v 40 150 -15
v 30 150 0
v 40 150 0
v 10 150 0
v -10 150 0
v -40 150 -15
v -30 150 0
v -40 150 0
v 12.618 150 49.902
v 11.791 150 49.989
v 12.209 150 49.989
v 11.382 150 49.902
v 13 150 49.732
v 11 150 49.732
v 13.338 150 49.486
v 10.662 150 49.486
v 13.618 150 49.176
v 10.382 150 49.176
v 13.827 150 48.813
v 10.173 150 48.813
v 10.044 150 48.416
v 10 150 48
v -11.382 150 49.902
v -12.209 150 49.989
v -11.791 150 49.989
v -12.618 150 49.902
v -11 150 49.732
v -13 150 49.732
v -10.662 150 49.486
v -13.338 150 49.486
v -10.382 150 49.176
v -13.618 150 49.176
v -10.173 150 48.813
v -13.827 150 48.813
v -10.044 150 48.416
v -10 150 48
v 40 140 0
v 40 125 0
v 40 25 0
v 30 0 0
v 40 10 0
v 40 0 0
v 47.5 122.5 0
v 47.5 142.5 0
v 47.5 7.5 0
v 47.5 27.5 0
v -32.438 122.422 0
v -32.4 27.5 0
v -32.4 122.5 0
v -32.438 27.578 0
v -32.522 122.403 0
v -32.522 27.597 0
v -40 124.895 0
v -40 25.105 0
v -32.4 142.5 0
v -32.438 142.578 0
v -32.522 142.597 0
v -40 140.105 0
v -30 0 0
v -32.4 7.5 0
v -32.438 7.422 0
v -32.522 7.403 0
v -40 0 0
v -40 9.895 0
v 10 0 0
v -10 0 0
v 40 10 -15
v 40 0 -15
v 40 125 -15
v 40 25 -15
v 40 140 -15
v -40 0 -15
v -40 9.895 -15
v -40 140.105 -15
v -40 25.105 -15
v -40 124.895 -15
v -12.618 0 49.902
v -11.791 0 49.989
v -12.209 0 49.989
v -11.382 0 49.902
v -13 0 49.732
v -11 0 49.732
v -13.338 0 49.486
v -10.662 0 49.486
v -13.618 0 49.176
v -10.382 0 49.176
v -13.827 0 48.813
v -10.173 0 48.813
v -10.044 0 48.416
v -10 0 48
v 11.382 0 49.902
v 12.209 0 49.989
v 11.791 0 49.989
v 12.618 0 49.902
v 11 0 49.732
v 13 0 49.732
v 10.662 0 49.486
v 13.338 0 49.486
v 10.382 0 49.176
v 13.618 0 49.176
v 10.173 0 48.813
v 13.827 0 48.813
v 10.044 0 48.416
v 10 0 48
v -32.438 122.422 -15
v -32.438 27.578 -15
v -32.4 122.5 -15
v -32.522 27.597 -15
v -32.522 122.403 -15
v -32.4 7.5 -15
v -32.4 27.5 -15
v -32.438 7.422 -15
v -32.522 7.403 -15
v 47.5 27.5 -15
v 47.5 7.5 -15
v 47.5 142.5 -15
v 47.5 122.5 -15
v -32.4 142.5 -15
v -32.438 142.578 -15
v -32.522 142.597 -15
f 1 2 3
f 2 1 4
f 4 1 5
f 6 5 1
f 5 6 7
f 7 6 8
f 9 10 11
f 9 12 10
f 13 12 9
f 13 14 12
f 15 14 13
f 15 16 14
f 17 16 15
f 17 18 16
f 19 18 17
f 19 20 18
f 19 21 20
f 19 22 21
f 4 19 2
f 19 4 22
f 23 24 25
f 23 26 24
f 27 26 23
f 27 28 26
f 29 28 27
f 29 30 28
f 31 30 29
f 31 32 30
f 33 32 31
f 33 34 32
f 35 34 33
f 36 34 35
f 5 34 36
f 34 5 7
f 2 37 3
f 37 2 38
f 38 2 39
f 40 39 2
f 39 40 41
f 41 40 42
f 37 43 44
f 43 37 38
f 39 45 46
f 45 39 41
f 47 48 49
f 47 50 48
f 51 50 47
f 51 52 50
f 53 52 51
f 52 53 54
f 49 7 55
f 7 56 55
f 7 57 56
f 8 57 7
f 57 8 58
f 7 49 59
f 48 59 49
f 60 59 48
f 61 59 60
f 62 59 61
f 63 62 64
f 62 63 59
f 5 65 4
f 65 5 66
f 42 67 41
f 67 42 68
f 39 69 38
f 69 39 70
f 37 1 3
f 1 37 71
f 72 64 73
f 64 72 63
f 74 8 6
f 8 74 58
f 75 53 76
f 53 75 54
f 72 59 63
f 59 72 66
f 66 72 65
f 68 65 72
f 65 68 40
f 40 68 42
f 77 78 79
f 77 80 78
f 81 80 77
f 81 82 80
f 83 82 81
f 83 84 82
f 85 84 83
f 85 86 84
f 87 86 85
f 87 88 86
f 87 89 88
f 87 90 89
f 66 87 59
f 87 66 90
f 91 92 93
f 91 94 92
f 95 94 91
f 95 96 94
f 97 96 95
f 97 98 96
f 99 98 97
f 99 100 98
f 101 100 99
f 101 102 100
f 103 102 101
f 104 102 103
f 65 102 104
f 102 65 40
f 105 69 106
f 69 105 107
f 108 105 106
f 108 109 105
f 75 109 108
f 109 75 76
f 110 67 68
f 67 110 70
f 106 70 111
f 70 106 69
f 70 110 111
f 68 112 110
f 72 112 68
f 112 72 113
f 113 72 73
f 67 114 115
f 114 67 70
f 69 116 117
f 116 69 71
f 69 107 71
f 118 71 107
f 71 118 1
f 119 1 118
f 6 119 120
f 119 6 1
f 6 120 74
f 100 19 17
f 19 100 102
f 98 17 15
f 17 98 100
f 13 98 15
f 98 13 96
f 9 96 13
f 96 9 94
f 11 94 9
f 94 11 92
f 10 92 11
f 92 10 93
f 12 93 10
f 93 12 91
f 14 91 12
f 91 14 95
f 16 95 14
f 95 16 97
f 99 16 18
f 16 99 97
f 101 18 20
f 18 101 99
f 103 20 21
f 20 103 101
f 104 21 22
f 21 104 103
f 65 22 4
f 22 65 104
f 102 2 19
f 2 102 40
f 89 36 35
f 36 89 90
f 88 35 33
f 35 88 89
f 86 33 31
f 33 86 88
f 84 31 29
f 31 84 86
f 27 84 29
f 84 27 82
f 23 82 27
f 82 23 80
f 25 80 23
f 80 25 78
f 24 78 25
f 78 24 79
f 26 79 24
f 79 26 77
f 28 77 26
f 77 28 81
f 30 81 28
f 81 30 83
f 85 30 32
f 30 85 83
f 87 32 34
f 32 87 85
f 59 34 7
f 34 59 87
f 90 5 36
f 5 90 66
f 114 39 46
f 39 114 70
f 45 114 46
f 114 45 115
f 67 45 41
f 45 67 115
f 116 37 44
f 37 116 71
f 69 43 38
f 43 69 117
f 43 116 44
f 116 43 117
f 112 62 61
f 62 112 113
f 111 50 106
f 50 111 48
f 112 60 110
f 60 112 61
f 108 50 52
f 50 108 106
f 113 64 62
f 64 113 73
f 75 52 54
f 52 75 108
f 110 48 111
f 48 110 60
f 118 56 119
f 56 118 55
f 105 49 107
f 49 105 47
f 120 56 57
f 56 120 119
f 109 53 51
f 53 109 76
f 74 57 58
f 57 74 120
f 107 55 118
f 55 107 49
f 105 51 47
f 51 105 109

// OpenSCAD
make_left_tabs = true;
make_right_tabs = true;
make_laptop_walls = true;

base_height = 15;
base_width = 80;
base_depth = 150;
base_rounding = 10;

tab_outer_width = 20;
tab_inner_width = 15;
tab_length = 7.5;

laptop_wall_thickness = 20;
laptop_wall_height = 50;
laptop_thickness = 20;
laptop_inset = 20;
laptop_wall_rounding = 2;

tab_outside_offset = 10;
tab_mating_tolerance = 0.1;

$fs = 0.1;

module tab(expand = 0) {
    points = [
        [0, tab_inner_width / 2],
        [tab_length, tab_outer_width / 2],
        [tab_length, -tab_outer_width / 2],
        [0, -tab_inner_width / 2]
    ];
    
    mirror([0, 0, 1]) linear_extrude(height=base_height) 
        if (expand == 0) {
            polygon(points);
        } else {
            hull() {
                for (p = points) {
                    translate(p) circle(r = expand);
                }
            }
        }
}

module wall_profile() {
    module triangle() {
        top_point = [laptop_wall_rounding, laptop_wall_height - laptop_wall_rounding];
        translate([laptop_thickness / 2, 0]) hull() {
            translate(top_point) circle(r = laptop_wall_rounding);
            polygon([
                top_point,
                [laptop_wall_thickness, 0],
                [0, 0]
            ]);
        }
    }
    union() {
        triangle();
        mirror([1, 0]) triangle();
    }
}

module base_body() {
    x = base_width / 2 - base_rounding;
    y1 = base_rounding;
    y2 = base_depth - base_rounding;
    right_points = [
        [x, y1],
        [x, y2],
    ];

    module right_side(has_tabs) {
        if (has_tabs) {
            cube([base_width / 2, base_depth, base_height]);
        } else {
            for (p = right_points) {
                translate(p) cylinder(h = base_height, r = base_rounding);
            }
        }
    }

    mirror([0, 0, 1]) hull() {
        right_side(make_right_tabs);
        mirror([1, 0, 0]) right_side(make_left_tabs);
    }
}

module main_body() {
    base_body();
    if (make_laptop_walls) {
        mirror([0, 1, 0]) rotate(90, [1, 0, 0]) linear_extrude(base_depth) wall_profile();
    }
}

outsidemost_tab_y = tab_length + tab_outside_offset;

module right_tabs() {
    translate([base_width/2, outsidemost_tab_y, 0]) tab();
    translate([base_width/2, base_depth - outsidemost_tab_y, 0]) tab();
}

module left_tab_negatives() {
    translate([-base_width/2, outsidemost_tab_y, 0]) tab(tab_mating_tolerance);
    translate([-base_width/2, base_depth - outsidemost_tab_y, 0]) tab(tab_mating_tolerance);
}

difference(){
    union() {
        main_body();
        if (make_right_tabs) {
            right_tabs();
        }
    }
    if (make_left_tabs) {
        left_tab_negatives();
    }
}
